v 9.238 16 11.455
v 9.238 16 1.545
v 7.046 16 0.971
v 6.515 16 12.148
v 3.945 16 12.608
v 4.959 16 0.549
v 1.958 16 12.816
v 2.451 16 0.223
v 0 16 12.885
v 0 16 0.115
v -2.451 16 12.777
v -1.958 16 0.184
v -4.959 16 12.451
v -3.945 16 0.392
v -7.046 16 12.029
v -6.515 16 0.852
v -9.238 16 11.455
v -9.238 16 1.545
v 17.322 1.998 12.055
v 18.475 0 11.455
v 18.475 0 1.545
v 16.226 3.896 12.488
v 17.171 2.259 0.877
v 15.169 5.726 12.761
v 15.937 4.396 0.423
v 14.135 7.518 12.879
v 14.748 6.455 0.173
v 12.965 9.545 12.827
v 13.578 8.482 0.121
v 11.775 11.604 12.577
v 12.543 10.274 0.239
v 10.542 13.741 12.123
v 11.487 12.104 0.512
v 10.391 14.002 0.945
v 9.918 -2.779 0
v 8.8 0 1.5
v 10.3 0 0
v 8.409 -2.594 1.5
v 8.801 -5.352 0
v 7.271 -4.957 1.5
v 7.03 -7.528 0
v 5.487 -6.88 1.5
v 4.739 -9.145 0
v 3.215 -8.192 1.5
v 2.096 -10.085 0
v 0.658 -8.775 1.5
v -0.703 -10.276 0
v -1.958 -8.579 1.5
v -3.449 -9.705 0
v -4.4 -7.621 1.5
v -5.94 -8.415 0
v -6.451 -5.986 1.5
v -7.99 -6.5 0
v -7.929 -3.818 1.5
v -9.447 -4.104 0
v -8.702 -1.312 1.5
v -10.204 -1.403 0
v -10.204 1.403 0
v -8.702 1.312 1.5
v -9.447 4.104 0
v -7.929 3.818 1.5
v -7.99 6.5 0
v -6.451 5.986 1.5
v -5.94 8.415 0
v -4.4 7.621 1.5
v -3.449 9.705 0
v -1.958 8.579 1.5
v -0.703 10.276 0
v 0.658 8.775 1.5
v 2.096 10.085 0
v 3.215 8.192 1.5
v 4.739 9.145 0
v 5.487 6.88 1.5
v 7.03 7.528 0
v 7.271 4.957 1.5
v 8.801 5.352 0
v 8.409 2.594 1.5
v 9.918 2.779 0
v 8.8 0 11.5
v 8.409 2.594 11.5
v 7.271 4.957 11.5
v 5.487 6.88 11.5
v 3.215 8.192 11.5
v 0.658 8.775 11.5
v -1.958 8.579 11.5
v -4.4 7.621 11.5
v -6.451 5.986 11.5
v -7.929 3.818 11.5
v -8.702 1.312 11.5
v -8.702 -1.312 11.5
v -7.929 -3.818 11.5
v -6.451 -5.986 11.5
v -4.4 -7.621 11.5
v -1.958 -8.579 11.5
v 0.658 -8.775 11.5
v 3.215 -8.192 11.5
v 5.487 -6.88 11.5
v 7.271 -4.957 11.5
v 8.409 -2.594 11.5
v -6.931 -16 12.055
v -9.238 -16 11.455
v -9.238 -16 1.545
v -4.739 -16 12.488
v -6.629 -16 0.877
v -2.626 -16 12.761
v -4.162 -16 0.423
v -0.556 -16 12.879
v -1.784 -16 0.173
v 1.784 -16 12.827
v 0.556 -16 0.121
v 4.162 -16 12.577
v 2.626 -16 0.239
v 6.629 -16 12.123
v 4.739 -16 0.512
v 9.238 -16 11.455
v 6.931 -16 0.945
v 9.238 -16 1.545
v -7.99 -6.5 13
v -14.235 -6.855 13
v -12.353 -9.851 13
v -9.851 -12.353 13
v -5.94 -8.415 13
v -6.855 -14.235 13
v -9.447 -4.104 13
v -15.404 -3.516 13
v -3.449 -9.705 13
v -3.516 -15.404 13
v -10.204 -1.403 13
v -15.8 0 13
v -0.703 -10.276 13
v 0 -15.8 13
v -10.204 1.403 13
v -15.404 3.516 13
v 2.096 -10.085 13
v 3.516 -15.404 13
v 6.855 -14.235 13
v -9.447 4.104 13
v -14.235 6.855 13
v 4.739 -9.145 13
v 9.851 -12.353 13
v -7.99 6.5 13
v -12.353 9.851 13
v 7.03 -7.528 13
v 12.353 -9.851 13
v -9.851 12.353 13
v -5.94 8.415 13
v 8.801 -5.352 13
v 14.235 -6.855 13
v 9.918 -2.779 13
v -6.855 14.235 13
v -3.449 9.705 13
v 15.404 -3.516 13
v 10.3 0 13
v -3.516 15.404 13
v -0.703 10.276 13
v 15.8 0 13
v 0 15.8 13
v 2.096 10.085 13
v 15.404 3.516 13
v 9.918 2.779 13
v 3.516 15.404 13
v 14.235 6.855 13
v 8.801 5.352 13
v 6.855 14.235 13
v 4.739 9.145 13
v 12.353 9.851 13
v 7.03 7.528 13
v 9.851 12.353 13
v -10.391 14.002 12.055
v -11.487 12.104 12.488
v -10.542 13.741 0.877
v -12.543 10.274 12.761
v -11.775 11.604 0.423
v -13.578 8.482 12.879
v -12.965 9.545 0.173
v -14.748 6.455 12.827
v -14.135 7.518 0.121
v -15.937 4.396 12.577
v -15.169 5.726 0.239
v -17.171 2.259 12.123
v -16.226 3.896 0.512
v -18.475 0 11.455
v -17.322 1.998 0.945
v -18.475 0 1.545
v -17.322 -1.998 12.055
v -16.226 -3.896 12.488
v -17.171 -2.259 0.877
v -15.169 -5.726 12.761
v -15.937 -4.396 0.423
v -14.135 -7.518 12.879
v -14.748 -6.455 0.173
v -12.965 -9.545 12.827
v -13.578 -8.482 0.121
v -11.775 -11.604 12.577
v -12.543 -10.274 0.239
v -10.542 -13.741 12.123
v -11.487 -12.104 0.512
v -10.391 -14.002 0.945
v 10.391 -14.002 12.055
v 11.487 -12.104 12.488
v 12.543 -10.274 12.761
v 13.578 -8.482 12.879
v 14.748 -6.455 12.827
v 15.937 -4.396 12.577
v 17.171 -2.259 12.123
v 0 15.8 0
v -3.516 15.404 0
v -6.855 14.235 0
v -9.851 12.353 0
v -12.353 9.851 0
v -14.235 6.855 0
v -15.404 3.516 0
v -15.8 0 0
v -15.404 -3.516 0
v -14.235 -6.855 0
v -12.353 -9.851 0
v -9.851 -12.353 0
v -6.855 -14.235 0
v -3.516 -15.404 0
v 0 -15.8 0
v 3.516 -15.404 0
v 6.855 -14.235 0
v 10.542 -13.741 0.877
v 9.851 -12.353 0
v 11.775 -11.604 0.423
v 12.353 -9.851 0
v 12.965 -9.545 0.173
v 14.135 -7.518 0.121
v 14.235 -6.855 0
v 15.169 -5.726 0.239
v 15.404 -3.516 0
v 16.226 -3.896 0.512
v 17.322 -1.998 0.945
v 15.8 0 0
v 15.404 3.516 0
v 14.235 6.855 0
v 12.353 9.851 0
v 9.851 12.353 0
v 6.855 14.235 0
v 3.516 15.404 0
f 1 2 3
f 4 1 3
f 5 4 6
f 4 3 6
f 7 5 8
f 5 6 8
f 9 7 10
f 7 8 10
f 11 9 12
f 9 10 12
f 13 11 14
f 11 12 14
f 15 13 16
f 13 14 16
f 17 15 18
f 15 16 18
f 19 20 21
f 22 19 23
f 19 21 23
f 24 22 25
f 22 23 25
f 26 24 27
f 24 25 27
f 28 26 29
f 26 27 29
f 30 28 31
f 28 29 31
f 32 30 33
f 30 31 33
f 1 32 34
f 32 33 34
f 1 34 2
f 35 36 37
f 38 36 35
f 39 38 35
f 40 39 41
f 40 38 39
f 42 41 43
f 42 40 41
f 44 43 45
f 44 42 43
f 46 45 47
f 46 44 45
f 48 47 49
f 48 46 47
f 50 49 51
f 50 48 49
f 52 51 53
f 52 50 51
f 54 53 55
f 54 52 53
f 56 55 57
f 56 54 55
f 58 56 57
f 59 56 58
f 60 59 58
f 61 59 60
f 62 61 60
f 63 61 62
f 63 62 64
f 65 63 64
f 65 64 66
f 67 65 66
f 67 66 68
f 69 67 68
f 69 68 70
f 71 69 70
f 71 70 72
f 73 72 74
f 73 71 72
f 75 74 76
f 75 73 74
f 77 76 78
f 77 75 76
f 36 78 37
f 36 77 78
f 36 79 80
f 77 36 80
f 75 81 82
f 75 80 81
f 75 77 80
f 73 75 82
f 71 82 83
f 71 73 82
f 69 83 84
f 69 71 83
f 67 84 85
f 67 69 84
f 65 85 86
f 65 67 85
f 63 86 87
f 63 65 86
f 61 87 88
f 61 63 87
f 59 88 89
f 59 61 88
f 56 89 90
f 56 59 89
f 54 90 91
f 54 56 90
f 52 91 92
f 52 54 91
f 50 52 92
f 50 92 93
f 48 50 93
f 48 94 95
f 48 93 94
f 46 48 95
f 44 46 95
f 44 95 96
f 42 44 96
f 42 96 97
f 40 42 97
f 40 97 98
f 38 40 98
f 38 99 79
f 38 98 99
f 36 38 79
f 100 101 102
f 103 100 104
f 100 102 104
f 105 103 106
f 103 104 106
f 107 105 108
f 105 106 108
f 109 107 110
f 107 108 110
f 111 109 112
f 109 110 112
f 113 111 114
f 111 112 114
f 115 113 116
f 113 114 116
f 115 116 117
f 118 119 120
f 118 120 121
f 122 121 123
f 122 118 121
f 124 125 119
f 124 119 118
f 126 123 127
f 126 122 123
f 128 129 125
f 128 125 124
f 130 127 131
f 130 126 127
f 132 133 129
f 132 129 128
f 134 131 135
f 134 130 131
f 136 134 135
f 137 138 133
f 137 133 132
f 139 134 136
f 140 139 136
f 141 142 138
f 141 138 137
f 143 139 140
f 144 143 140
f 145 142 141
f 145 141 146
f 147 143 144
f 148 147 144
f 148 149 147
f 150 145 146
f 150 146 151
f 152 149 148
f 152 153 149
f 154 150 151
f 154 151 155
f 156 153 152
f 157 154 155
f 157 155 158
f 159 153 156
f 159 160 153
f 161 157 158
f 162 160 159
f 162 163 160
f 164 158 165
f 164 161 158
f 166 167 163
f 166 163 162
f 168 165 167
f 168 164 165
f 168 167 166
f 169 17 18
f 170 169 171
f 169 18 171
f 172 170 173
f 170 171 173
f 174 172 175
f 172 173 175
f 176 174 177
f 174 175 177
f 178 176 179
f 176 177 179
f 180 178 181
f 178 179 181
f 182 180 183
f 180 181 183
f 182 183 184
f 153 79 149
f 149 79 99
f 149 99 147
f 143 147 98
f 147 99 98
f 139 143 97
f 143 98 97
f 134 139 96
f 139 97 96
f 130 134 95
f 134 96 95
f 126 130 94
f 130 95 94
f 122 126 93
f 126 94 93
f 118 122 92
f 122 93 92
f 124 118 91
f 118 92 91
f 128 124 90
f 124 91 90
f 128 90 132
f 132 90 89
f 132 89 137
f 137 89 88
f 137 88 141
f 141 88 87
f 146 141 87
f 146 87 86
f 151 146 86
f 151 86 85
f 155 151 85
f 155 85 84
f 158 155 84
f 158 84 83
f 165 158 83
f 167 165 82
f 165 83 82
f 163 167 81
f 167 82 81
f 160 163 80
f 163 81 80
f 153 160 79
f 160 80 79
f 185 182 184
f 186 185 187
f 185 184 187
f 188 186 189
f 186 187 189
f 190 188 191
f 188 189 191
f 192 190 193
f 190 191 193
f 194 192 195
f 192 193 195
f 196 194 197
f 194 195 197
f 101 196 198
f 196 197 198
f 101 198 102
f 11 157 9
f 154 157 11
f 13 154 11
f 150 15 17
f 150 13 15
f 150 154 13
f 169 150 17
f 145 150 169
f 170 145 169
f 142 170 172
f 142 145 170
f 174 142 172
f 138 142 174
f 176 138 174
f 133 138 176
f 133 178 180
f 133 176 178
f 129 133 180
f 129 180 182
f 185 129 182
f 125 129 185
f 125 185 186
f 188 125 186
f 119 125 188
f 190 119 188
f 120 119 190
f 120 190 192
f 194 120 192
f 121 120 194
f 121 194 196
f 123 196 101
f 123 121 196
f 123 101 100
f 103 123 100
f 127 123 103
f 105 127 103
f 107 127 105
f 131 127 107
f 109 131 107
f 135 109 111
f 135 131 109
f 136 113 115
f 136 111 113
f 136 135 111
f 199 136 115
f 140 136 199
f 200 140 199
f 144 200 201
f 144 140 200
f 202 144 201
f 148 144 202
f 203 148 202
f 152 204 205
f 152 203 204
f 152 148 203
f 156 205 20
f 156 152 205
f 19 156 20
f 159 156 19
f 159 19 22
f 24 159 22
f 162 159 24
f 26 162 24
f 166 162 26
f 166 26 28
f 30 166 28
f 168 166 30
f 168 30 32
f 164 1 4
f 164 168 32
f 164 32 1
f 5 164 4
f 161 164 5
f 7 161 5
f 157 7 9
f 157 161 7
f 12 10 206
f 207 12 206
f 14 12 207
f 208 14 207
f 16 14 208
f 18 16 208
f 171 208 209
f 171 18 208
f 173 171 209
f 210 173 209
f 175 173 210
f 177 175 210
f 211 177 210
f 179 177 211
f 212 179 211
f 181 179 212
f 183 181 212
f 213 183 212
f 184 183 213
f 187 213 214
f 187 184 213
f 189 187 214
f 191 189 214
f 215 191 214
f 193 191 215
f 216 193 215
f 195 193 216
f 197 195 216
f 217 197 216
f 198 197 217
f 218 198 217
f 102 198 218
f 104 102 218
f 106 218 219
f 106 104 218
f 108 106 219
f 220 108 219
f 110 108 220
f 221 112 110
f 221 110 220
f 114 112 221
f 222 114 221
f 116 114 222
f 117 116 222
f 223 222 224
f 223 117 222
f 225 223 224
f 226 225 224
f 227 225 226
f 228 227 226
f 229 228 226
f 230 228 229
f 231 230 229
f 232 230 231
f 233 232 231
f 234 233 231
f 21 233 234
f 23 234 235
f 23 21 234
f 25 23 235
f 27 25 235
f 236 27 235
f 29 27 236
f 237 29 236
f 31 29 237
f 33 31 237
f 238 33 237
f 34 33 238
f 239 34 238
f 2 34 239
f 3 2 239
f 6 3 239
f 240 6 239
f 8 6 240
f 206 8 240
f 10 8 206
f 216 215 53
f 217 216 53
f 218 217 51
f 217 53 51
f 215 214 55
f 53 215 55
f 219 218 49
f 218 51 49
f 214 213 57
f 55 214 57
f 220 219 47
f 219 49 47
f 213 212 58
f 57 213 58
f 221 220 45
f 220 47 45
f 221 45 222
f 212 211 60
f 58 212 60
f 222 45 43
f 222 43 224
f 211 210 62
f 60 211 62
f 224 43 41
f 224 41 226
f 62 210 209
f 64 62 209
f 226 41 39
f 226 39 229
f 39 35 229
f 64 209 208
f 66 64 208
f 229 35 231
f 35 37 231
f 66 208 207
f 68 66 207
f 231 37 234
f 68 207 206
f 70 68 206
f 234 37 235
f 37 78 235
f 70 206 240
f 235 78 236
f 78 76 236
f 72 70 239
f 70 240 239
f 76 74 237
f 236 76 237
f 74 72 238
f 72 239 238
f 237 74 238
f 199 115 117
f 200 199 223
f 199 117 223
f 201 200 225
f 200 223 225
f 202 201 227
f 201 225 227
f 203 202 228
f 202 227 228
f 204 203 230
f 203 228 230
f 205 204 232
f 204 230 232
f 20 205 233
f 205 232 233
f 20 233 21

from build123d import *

# Parameters (mm, degrees)
CYLINDER001_R     = 8.8
CYLINDER001_DEPTH = 30
PAD_DEPTH         = 13
CHAMFER001_SIZE   = 1.5


with BuildPart() as cilindro001:
    # Cylinder001 → Cylinder001 (new body)
    with BuildSketch(Plane.XY.offset(-10)):
        Circle(CYLINDER001_R)
    extrude(amount=CYLINDER001_DEPTH)


with BuildPart() as revolution:
    # Sketch001 → Revolution (revolve)
    with BuildSketch(Plane.YZ):
        Polygon((23.594229, 8.5), (15.8, 13), (25.8, 13), (25.8, 0), (15.8, 0), (23.594229, 4.5), align=None)
    revolve(axis=Axis((0, 0, 0), (0, 0, 1)))


with BuildPart() as chamfer001:
    # Sketch → Pad (new body)
    with BuildSketch(Plane.XY):
        Polygon((9.237604, 16), (-9.237604, 16), (-18.475209, 0), (-9.237604, -16), (9.237604, -16), (18.475209, 0), align=None)
    extrude(amount=PAD_DEPTH)

    # Cut: cut Revolution
    add(revolution.part, mode=Mode.SUBTRACT)

    # Cut002: cut Cilindro001
    add(cilindro001.part, mode=Mode.SUBTRACT)

    # Chamfer001
    chamfer001_edges = [chamfer001.edges().sort_by_distance(p)[0] for p in [
        (-8.8, 0, 13),
        (-8.8, 0, 0),
    ]]
    chamfer(chamfer001_edges, length=CHAMFER001_SIZE)


solid = chamfer001.part
